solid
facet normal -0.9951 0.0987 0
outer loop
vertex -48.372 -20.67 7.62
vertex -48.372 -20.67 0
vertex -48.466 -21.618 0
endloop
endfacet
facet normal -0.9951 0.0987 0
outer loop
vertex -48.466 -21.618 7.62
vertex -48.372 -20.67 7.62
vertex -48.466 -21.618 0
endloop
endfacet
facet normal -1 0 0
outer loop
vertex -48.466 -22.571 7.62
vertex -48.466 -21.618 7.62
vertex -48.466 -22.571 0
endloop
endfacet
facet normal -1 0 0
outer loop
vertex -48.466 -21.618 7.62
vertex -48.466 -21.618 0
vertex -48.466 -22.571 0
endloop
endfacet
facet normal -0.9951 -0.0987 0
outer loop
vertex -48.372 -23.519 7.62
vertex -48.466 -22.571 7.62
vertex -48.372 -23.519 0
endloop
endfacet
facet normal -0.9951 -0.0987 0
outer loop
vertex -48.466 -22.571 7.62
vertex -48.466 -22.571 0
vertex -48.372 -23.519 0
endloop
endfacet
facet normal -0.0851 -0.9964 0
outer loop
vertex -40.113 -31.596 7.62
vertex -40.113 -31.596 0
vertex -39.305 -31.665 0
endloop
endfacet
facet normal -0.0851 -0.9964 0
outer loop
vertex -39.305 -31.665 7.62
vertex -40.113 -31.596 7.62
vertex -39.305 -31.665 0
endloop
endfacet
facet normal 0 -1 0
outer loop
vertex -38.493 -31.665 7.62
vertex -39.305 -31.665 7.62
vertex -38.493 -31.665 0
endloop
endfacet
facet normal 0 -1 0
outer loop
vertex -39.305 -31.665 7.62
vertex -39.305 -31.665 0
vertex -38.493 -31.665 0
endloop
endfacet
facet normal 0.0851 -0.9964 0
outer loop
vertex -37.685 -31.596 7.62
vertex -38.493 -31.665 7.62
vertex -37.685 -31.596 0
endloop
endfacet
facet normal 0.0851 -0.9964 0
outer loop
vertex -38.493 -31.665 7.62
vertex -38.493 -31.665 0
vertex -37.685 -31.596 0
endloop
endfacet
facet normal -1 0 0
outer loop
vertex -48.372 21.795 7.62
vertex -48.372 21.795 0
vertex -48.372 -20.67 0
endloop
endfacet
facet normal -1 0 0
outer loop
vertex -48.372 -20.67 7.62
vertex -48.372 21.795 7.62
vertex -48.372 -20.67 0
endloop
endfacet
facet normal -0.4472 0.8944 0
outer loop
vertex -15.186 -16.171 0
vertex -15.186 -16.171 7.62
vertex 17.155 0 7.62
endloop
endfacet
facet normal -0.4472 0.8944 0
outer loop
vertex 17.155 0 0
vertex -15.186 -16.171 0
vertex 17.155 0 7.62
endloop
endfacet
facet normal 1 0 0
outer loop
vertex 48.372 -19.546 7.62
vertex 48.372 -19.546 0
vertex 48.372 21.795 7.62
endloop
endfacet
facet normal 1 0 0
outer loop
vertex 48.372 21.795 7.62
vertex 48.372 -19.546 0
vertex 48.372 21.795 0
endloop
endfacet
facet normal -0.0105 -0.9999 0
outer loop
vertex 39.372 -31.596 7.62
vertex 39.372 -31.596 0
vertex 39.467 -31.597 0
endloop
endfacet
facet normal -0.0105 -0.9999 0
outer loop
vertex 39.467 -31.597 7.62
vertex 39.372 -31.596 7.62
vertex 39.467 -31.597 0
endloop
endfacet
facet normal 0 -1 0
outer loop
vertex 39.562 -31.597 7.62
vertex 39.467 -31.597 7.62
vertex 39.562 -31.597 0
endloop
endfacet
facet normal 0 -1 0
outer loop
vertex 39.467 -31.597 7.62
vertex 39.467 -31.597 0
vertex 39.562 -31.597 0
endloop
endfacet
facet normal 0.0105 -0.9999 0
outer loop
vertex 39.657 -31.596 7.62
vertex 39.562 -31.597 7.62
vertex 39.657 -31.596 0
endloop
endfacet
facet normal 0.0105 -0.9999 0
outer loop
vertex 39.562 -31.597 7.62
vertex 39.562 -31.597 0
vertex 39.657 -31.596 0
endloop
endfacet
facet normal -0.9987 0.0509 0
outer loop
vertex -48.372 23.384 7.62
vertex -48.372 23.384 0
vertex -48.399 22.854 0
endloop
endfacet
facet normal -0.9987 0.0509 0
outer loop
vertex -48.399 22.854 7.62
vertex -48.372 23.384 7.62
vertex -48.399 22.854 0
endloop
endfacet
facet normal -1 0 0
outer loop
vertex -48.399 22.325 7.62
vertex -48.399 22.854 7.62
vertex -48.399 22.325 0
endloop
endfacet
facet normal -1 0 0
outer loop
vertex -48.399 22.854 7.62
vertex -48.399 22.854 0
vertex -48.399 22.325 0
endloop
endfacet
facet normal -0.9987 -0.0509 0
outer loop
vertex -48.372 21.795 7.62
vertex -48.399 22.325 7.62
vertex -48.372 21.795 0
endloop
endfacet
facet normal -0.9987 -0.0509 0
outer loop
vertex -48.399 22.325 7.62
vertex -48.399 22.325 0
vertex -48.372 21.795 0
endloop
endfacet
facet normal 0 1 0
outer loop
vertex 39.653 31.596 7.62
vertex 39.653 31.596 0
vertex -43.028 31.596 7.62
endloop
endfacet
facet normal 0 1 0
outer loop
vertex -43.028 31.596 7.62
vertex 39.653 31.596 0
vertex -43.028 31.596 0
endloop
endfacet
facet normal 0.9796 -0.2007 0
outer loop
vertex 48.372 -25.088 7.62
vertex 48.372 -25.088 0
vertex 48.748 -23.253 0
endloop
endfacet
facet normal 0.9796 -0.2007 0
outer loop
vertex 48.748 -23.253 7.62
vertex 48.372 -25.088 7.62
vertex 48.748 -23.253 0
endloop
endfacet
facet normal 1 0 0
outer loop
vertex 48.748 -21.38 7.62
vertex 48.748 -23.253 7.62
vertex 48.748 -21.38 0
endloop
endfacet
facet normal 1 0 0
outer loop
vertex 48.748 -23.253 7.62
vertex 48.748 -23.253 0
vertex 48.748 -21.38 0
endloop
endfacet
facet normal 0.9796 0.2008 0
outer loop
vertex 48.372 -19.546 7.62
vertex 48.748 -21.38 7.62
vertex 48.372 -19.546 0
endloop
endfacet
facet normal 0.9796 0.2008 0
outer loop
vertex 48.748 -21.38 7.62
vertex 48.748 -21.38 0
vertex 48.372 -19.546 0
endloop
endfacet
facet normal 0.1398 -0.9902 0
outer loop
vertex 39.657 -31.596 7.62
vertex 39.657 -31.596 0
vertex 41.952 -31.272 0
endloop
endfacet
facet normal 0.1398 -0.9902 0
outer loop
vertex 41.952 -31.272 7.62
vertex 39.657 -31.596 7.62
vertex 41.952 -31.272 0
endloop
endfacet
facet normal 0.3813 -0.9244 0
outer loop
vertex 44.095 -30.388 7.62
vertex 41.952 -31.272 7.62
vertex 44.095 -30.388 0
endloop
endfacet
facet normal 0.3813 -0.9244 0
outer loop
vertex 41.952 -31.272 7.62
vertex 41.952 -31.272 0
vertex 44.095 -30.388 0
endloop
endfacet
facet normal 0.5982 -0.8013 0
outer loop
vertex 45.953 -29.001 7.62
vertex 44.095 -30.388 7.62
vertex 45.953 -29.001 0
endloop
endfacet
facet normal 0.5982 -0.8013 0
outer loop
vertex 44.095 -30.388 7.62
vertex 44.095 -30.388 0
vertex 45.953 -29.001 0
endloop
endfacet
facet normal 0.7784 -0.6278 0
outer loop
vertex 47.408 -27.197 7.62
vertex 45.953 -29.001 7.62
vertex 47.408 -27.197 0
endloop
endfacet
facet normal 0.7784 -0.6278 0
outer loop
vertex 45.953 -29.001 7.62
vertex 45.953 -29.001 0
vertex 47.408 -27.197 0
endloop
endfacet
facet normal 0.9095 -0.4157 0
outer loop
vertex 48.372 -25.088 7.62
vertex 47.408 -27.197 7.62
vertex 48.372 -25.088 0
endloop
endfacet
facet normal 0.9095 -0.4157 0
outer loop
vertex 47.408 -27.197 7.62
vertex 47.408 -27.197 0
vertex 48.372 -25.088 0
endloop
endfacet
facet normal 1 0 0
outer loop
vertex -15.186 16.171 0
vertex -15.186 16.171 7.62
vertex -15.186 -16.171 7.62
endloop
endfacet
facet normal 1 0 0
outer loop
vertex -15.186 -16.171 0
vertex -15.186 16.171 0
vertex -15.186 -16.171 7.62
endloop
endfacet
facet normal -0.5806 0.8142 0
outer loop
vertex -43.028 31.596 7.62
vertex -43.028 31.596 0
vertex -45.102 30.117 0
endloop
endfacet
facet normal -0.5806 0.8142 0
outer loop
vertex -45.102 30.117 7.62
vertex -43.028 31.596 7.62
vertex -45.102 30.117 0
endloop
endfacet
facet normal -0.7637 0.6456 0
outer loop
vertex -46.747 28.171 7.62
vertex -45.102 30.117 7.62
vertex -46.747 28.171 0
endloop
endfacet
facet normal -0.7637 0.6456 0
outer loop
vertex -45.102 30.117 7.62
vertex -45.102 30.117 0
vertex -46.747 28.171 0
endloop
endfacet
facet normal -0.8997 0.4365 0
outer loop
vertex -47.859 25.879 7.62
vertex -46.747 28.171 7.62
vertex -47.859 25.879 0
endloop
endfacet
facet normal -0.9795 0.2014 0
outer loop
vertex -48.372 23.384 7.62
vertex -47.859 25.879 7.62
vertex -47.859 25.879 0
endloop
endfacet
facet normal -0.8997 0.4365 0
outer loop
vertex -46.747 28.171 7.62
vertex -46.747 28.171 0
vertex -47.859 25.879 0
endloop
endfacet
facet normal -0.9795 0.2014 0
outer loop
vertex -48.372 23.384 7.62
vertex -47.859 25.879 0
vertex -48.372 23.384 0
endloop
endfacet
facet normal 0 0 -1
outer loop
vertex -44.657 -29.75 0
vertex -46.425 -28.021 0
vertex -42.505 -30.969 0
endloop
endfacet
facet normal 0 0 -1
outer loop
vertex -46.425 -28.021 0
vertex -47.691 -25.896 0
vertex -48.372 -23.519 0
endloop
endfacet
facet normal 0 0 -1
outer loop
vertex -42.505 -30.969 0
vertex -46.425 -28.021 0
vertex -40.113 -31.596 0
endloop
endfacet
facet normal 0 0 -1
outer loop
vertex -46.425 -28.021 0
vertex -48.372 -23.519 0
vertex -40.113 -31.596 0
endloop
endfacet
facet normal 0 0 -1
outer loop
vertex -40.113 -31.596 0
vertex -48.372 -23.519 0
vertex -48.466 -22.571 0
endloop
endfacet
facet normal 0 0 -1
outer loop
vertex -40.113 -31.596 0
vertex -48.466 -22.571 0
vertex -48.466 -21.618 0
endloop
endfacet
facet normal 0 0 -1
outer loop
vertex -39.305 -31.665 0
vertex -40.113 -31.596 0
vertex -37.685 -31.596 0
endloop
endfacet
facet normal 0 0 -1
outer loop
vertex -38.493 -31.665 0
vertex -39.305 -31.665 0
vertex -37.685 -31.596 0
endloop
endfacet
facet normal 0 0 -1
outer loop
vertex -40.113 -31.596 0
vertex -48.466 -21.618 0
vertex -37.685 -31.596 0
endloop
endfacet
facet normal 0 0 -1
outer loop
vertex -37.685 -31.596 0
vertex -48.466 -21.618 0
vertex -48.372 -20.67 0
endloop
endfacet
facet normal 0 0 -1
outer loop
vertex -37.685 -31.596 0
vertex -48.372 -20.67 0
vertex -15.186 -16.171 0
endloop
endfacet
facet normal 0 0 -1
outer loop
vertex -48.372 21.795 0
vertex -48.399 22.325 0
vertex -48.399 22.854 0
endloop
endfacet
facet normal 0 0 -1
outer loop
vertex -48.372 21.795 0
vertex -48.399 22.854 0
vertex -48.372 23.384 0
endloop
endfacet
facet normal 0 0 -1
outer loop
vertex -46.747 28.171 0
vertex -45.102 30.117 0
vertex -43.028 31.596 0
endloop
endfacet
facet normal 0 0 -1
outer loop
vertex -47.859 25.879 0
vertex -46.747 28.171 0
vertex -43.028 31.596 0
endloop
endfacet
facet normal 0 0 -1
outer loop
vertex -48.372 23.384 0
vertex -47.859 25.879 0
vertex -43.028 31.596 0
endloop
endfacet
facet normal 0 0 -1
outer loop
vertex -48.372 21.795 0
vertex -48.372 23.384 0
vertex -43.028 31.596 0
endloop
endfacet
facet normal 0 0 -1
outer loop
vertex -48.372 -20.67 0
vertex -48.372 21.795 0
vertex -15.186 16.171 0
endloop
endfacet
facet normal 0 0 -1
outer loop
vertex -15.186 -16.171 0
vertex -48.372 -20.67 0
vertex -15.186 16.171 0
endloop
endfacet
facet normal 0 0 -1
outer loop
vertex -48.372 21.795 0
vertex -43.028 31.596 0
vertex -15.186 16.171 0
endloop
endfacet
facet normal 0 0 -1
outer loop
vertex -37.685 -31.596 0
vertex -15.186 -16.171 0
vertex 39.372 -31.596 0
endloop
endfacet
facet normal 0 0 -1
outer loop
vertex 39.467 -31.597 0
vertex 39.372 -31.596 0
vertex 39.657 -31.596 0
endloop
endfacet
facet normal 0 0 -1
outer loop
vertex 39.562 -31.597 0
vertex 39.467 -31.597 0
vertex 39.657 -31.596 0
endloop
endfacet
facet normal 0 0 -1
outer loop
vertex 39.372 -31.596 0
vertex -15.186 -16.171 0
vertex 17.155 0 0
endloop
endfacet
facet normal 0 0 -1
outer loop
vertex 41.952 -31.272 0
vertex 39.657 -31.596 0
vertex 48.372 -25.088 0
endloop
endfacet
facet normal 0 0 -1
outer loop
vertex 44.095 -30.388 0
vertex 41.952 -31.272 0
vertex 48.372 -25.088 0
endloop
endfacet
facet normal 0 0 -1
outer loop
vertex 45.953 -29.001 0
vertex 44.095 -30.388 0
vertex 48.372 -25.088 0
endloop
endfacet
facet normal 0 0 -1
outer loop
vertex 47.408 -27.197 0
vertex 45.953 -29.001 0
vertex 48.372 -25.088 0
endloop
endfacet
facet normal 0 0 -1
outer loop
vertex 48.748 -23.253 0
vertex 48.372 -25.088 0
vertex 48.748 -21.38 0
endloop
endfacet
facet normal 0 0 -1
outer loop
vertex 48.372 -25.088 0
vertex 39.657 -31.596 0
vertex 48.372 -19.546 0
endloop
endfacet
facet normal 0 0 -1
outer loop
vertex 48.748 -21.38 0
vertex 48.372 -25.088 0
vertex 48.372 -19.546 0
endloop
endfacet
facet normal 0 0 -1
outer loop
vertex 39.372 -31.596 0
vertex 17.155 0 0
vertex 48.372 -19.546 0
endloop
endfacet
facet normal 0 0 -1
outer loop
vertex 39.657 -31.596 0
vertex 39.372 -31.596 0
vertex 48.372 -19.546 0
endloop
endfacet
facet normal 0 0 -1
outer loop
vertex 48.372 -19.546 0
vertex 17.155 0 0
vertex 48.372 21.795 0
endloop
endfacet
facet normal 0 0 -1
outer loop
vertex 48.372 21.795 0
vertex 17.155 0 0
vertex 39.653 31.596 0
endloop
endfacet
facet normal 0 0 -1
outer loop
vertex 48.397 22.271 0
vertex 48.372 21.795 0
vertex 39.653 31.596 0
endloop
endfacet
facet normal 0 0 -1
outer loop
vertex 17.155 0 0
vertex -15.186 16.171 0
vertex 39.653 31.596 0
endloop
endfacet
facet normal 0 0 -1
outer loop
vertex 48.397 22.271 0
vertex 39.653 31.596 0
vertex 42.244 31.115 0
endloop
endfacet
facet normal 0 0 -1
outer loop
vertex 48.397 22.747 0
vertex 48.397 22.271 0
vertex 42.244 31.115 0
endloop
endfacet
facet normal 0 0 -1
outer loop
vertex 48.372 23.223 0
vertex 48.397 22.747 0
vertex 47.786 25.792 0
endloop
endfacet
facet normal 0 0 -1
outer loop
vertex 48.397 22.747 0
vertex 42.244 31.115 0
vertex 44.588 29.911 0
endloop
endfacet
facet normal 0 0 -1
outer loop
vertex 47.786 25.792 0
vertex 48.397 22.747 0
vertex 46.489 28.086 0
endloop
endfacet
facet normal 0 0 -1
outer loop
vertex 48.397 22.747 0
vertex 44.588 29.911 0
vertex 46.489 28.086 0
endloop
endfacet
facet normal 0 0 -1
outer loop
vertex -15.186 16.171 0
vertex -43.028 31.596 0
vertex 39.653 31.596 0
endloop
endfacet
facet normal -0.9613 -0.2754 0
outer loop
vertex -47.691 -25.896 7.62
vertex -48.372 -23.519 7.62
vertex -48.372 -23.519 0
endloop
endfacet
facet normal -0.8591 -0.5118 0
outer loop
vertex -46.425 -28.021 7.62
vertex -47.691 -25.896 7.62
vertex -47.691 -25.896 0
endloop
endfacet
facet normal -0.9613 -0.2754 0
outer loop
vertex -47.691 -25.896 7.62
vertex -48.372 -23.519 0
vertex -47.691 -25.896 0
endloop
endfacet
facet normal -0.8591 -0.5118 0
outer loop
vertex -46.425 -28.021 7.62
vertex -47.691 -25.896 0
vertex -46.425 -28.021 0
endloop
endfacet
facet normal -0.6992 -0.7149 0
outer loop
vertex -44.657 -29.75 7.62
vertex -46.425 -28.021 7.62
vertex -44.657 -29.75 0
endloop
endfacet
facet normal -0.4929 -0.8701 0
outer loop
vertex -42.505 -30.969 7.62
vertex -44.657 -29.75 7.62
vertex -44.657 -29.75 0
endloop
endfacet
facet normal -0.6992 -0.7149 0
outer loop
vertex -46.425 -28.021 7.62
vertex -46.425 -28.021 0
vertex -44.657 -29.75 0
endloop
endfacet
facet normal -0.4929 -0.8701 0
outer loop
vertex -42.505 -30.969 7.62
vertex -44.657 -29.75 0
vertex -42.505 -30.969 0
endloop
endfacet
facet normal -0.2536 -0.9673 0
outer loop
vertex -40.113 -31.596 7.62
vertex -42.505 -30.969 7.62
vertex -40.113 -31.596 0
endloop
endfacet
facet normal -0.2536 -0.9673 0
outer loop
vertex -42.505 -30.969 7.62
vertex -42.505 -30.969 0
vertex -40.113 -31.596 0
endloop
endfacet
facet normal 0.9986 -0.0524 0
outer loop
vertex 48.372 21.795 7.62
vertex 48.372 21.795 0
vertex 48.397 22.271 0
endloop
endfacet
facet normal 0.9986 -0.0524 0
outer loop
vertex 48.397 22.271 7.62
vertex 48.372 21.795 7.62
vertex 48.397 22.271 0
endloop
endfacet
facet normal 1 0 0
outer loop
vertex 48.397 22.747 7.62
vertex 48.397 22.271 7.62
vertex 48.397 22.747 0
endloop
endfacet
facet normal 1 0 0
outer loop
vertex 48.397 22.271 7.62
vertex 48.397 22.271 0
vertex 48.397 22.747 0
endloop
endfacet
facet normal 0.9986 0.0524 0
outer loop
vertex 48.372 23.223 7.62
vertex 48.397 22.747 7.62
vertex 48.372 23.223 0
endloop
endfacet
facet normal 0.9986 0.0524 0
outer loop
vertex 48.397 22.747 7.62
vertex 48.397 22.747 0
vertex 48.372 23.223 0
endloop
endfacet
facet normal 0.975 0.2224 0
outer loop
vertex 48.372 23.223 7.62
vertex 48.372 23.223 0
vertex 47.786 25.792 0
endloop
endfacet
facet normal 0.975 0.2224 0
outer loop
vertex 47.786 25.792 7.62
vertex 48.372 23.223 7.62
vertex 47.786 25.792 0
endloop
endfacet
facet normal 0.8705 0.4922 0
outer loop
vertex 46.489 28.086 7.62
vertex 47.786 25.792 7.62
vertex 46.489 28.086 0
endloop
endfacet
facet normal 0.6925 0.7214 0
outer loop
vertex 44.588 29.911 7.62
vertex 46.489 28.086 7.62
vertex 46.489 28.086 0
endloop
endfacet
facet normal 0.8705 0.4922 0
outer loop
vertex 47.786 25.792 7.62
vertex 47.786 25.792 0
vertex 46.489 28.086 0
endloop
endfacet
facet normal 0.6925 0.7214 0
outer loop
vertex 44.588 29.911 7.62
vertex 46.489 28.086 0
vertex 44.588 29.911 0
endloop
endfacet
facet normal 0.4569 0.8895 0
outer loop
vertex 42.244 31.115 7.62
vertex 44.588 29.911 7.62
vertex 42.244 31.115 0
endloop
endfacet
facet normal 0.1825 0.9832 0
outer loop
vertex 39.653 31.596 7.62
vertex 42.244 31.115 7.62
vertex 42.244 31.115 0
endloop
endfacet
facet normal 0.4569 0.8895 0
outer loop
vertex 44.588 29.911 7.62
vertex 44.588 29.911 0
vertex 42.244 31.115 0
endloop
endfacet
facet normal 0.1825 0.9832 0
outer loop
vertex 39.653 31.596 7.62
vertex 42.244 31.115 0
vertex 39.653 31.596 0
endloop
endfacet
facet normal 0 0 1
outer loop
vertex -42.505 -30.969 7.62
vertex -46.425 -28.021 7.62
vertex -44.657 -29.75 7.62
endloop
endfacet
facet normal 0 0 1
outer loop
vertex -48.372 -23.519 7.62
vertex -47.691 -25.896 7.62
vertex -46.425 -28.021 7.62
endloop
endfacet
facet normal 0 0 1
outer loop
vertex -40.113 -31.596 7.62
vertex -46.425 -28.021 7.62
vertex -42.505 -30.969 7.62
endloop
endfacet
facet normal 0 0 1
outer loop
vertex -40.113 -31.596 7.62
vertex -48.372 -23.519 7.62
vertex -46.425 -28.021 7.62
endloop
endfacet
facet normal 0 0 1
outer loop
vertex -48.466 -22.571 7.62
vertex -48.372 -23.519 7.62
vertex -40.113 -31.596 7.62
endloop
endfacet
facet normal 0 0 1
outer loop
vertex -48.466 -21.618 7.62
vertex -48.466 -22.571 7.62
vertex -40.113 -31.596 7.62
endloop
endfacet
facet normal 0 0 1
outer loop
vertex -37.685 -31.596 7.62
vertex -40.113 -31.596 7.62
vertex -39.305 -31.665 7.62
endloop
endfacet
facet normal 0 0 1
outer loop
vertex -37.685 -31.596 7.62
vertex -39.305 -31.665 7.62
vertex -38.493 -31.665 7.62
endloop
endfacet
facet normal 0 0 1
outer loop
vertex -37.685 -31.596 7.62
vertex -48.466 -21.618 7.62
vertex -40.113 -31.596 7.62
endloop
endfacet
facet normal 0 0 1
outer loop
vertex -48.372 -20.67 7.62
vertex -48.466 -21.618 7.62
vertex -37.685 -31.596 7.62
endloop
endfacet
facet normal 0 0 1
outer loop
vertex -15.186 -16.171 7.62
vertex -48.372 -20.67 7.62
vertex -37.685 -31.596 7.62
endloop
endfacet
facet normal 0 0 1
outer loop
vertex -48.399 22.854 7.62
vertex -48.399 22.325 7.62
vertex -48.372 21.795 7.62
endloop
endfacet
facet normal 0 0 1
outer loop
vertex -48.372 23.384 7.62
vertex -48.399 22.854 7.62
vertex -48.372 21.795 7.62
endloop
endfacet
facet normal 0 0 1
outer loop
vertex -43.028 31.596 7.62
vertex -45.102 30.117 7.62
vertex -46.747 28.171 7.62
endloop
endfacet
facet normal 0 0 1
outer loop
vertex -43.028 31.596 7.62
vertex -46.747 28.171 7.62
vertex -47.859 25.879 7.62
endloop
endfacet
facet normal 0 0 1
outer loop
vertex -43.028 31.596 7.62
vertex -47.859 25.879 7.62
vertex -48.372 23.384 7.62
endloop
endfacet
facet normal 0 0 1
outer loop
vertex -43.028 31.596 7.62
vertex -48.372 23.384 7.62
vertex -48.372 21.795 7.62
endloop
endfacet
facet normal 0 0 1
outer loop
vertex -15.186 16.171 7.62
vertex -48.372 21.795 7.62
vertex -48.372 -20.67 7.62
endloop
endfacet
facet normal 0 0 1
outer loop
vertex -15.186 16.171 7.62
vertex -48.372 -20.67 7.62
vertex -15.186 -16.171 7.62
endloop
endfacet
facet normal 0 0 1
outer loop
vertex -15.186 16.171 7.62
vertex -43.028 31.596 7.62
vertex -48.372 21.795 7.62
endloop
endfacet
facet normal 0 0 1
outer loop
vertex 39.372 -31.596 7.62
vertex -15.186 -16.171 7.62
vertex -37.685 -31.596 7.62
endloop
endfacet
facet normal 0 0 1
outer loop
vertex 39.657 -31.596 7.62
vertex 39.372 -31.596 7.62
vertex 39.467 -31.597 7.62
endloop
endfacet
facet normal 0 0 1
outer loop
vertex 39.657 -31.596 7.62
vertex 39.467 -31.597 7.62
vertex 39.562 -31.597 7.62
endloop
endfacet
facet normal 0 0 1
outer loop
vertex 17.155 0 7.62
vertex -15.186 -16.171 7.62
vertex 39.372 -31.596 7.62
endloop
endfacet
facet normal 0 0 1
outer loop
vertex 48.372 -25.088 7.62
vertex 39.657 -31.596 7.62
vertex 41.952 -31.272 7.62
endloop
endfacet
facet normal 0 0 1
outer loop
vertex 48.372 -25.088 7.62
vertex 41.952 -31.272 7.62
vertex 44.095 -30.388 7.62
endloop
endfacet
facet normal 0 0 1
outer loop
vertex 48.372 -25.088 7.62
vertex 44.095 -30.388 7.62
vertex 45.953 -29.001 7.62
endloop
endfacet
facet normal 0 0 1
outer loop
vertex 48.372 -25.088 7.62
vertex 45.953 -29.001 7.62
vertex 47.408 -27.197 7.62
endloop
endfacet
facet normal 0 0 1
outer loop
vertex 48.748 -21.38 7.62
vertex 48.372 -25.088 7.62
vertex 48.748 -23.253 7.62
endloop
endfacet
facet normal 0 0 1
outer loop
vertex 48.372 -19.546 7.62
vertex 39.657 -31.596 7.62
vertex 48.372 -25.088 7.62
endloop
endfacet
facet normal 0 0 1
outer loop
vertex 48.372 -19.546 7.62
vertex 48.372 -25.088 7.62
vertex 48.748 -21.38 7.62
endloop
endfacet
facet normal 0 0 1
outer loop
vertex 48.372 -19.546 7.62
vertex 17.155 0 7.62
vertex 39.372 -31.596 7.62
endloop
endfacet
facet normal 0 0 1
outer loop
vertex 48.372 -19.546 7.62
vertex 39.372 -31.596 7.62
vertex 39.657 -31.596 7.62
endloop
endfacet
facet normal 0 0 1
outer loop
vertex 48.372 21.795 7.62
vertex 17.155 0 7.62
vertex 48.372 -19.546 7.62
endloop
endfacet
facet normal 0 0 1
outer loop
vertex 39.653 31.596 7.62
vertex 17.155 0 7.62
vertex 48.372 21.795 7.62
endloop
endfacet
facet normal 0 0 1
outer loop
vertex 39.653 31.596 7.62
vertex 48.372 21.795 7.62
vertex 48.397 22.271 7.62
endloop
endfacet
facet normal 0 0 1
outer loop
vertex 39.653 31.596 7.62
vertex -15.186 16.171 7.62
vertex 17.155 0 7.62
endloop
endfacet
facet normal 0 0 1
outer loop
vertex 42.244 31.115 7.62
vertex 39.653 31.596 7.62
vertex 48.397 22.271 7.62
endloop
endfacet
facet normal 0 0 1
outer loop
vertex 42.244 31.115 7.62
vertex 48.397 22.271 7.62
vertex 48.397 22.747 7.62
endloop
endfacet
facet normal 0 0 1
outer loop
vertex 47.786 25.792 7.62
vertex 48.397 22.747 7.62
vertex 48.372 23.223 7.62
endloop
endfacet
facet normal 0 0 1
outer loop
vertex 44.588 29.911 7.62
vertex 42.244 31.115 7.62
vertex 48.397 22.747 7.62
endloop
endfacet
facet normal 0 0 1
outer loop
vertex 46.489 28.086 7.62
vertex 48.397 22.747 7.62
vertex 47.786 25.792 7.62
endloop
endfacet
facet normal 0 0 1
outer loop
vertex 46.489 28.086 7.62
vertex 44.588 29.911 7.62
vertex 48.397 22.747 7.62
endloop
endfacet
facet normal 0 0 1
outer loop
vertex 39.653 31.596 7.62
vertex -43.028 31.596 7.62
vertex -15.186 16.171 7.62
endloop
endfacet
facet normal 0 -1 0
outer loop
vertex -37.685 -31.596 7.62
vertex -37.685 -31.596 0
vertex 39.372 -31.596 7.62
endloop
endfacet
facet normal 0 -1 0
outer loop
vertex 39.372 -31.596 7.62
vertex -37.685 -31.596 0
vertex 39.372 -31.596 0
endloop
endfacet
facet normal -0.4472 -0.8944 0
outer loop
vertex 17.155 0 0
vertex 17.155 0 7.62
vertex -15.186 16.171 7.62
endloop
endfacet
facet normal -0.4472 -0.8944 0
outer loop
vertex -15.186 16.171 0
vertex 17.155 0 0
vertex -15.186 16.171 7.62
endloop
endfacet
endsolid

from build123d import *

# Parameters (mm, degrees)
F1_DEPTH = 7.62
F3_DEPTH = 7.62


with BuildPart() as f1:
    # F0 (on Top) → F1 (new body)
    with BuildSketch(Plane.XY):
        with BuildLine():
            ThreePointArc((48.371598, 23.222628), (45.605213, 29.067693), (39.653465, 31.5964))
            Line((39.653465, 31.5964), (-43.028224, 31.5964))
            ThreePointArc((-43.028224, 31.5964), (-46.746564, 28.170959), (-48.371598, 23.383585))
            Line((-48.371598, 23.383585), (-48.371598, 21.795344))
            Line((-48.371598, 21.795344), (-48.371598, -20.670423))
            Line((-48.371598, -20.670423), (-48.371598, -23.518627))
            ThreePointArc((-48.371598, -23.518627), (-45.597003, -28.942544), (-40.112998, -31.5964))
            Line((-40.112998, -31.5964), (-37.68485, -31.5964))
            Line((-37.68485, -31.5964), (39.372232, -31.5964))
            Line((39.372232, -31.5964), (39.65662, -31.5964))
            ThreePointArc((39.65662, -31.5964), (45.067462, -29.752844), (48.371598, -25.088232))
            Line((48.371598, -25.088232), (48.371598, -19.545501))
            Line((48.371598, -19.545501), (48.371598, 21.795344))
            Line((48.371598, 21.795344), (48.371598, 23.222628))
        make_face()
        with BuildLine():
            ThreePointArc((48.371598, 21.795344), (48.399642, 22.508986), (48.371598, 23.222628))
            Line((48.371598, 23.222628), (48.371598, 21.795344))
        make_face()
        with BuildLine():
            Line((-48.371598, 21.795344), (-48.371598, 23.383585))
            ThreePointArc((-48.371598, 23.383585), (-48.402453, 22.589464), (-48.371598, 21.795344))
        make_face()
        with BuildLine():
            ThreePointArc((48.371598, -25.088232), (48.795049, -22.316866), (48.371598, -19.545501))
            Line((48.371598, -19.545501), (48.371598, -25.088232))
        make_face()
        with BuildLine():
            Line((-48.371598, -23.518627), (-48.371598, -20.670423))
            ThreePointArc((-48.371598, -20.670423), (-48.478048, -22.094525), (-48.371598, -23.518627))
        make_face()
        with BuildLine():
            ThreePointArc((39.372232, -31.5964), (39.514426, -31.59749), (39.65662, -31.5964))
            Line((39.65662, -31.5964), (39.372232, -31.5964))
        make_face()
        with BuildLine():
            Line((-37.68485, -31.5964), (-40.112998, -31.5964))
            ThreePointArc((-40.112998, -31.5964), (-38.898924, -31.673649), (-37.68485, -31.5964))
        make_face()
    extrude(amount=F1_DEPTH)

    # F2 (on face) → F3 (cut)
    with BuildSketch(Plane.XY.offset(7.62)):
        Polygon((17.155044, 0), (-15.186432, 16.170738), (-15.186432, -16.170738), align=None)
    extrude(amount=-F3_DEPTH, mode=Mode.SUBTRACT)


solid = f1.part
